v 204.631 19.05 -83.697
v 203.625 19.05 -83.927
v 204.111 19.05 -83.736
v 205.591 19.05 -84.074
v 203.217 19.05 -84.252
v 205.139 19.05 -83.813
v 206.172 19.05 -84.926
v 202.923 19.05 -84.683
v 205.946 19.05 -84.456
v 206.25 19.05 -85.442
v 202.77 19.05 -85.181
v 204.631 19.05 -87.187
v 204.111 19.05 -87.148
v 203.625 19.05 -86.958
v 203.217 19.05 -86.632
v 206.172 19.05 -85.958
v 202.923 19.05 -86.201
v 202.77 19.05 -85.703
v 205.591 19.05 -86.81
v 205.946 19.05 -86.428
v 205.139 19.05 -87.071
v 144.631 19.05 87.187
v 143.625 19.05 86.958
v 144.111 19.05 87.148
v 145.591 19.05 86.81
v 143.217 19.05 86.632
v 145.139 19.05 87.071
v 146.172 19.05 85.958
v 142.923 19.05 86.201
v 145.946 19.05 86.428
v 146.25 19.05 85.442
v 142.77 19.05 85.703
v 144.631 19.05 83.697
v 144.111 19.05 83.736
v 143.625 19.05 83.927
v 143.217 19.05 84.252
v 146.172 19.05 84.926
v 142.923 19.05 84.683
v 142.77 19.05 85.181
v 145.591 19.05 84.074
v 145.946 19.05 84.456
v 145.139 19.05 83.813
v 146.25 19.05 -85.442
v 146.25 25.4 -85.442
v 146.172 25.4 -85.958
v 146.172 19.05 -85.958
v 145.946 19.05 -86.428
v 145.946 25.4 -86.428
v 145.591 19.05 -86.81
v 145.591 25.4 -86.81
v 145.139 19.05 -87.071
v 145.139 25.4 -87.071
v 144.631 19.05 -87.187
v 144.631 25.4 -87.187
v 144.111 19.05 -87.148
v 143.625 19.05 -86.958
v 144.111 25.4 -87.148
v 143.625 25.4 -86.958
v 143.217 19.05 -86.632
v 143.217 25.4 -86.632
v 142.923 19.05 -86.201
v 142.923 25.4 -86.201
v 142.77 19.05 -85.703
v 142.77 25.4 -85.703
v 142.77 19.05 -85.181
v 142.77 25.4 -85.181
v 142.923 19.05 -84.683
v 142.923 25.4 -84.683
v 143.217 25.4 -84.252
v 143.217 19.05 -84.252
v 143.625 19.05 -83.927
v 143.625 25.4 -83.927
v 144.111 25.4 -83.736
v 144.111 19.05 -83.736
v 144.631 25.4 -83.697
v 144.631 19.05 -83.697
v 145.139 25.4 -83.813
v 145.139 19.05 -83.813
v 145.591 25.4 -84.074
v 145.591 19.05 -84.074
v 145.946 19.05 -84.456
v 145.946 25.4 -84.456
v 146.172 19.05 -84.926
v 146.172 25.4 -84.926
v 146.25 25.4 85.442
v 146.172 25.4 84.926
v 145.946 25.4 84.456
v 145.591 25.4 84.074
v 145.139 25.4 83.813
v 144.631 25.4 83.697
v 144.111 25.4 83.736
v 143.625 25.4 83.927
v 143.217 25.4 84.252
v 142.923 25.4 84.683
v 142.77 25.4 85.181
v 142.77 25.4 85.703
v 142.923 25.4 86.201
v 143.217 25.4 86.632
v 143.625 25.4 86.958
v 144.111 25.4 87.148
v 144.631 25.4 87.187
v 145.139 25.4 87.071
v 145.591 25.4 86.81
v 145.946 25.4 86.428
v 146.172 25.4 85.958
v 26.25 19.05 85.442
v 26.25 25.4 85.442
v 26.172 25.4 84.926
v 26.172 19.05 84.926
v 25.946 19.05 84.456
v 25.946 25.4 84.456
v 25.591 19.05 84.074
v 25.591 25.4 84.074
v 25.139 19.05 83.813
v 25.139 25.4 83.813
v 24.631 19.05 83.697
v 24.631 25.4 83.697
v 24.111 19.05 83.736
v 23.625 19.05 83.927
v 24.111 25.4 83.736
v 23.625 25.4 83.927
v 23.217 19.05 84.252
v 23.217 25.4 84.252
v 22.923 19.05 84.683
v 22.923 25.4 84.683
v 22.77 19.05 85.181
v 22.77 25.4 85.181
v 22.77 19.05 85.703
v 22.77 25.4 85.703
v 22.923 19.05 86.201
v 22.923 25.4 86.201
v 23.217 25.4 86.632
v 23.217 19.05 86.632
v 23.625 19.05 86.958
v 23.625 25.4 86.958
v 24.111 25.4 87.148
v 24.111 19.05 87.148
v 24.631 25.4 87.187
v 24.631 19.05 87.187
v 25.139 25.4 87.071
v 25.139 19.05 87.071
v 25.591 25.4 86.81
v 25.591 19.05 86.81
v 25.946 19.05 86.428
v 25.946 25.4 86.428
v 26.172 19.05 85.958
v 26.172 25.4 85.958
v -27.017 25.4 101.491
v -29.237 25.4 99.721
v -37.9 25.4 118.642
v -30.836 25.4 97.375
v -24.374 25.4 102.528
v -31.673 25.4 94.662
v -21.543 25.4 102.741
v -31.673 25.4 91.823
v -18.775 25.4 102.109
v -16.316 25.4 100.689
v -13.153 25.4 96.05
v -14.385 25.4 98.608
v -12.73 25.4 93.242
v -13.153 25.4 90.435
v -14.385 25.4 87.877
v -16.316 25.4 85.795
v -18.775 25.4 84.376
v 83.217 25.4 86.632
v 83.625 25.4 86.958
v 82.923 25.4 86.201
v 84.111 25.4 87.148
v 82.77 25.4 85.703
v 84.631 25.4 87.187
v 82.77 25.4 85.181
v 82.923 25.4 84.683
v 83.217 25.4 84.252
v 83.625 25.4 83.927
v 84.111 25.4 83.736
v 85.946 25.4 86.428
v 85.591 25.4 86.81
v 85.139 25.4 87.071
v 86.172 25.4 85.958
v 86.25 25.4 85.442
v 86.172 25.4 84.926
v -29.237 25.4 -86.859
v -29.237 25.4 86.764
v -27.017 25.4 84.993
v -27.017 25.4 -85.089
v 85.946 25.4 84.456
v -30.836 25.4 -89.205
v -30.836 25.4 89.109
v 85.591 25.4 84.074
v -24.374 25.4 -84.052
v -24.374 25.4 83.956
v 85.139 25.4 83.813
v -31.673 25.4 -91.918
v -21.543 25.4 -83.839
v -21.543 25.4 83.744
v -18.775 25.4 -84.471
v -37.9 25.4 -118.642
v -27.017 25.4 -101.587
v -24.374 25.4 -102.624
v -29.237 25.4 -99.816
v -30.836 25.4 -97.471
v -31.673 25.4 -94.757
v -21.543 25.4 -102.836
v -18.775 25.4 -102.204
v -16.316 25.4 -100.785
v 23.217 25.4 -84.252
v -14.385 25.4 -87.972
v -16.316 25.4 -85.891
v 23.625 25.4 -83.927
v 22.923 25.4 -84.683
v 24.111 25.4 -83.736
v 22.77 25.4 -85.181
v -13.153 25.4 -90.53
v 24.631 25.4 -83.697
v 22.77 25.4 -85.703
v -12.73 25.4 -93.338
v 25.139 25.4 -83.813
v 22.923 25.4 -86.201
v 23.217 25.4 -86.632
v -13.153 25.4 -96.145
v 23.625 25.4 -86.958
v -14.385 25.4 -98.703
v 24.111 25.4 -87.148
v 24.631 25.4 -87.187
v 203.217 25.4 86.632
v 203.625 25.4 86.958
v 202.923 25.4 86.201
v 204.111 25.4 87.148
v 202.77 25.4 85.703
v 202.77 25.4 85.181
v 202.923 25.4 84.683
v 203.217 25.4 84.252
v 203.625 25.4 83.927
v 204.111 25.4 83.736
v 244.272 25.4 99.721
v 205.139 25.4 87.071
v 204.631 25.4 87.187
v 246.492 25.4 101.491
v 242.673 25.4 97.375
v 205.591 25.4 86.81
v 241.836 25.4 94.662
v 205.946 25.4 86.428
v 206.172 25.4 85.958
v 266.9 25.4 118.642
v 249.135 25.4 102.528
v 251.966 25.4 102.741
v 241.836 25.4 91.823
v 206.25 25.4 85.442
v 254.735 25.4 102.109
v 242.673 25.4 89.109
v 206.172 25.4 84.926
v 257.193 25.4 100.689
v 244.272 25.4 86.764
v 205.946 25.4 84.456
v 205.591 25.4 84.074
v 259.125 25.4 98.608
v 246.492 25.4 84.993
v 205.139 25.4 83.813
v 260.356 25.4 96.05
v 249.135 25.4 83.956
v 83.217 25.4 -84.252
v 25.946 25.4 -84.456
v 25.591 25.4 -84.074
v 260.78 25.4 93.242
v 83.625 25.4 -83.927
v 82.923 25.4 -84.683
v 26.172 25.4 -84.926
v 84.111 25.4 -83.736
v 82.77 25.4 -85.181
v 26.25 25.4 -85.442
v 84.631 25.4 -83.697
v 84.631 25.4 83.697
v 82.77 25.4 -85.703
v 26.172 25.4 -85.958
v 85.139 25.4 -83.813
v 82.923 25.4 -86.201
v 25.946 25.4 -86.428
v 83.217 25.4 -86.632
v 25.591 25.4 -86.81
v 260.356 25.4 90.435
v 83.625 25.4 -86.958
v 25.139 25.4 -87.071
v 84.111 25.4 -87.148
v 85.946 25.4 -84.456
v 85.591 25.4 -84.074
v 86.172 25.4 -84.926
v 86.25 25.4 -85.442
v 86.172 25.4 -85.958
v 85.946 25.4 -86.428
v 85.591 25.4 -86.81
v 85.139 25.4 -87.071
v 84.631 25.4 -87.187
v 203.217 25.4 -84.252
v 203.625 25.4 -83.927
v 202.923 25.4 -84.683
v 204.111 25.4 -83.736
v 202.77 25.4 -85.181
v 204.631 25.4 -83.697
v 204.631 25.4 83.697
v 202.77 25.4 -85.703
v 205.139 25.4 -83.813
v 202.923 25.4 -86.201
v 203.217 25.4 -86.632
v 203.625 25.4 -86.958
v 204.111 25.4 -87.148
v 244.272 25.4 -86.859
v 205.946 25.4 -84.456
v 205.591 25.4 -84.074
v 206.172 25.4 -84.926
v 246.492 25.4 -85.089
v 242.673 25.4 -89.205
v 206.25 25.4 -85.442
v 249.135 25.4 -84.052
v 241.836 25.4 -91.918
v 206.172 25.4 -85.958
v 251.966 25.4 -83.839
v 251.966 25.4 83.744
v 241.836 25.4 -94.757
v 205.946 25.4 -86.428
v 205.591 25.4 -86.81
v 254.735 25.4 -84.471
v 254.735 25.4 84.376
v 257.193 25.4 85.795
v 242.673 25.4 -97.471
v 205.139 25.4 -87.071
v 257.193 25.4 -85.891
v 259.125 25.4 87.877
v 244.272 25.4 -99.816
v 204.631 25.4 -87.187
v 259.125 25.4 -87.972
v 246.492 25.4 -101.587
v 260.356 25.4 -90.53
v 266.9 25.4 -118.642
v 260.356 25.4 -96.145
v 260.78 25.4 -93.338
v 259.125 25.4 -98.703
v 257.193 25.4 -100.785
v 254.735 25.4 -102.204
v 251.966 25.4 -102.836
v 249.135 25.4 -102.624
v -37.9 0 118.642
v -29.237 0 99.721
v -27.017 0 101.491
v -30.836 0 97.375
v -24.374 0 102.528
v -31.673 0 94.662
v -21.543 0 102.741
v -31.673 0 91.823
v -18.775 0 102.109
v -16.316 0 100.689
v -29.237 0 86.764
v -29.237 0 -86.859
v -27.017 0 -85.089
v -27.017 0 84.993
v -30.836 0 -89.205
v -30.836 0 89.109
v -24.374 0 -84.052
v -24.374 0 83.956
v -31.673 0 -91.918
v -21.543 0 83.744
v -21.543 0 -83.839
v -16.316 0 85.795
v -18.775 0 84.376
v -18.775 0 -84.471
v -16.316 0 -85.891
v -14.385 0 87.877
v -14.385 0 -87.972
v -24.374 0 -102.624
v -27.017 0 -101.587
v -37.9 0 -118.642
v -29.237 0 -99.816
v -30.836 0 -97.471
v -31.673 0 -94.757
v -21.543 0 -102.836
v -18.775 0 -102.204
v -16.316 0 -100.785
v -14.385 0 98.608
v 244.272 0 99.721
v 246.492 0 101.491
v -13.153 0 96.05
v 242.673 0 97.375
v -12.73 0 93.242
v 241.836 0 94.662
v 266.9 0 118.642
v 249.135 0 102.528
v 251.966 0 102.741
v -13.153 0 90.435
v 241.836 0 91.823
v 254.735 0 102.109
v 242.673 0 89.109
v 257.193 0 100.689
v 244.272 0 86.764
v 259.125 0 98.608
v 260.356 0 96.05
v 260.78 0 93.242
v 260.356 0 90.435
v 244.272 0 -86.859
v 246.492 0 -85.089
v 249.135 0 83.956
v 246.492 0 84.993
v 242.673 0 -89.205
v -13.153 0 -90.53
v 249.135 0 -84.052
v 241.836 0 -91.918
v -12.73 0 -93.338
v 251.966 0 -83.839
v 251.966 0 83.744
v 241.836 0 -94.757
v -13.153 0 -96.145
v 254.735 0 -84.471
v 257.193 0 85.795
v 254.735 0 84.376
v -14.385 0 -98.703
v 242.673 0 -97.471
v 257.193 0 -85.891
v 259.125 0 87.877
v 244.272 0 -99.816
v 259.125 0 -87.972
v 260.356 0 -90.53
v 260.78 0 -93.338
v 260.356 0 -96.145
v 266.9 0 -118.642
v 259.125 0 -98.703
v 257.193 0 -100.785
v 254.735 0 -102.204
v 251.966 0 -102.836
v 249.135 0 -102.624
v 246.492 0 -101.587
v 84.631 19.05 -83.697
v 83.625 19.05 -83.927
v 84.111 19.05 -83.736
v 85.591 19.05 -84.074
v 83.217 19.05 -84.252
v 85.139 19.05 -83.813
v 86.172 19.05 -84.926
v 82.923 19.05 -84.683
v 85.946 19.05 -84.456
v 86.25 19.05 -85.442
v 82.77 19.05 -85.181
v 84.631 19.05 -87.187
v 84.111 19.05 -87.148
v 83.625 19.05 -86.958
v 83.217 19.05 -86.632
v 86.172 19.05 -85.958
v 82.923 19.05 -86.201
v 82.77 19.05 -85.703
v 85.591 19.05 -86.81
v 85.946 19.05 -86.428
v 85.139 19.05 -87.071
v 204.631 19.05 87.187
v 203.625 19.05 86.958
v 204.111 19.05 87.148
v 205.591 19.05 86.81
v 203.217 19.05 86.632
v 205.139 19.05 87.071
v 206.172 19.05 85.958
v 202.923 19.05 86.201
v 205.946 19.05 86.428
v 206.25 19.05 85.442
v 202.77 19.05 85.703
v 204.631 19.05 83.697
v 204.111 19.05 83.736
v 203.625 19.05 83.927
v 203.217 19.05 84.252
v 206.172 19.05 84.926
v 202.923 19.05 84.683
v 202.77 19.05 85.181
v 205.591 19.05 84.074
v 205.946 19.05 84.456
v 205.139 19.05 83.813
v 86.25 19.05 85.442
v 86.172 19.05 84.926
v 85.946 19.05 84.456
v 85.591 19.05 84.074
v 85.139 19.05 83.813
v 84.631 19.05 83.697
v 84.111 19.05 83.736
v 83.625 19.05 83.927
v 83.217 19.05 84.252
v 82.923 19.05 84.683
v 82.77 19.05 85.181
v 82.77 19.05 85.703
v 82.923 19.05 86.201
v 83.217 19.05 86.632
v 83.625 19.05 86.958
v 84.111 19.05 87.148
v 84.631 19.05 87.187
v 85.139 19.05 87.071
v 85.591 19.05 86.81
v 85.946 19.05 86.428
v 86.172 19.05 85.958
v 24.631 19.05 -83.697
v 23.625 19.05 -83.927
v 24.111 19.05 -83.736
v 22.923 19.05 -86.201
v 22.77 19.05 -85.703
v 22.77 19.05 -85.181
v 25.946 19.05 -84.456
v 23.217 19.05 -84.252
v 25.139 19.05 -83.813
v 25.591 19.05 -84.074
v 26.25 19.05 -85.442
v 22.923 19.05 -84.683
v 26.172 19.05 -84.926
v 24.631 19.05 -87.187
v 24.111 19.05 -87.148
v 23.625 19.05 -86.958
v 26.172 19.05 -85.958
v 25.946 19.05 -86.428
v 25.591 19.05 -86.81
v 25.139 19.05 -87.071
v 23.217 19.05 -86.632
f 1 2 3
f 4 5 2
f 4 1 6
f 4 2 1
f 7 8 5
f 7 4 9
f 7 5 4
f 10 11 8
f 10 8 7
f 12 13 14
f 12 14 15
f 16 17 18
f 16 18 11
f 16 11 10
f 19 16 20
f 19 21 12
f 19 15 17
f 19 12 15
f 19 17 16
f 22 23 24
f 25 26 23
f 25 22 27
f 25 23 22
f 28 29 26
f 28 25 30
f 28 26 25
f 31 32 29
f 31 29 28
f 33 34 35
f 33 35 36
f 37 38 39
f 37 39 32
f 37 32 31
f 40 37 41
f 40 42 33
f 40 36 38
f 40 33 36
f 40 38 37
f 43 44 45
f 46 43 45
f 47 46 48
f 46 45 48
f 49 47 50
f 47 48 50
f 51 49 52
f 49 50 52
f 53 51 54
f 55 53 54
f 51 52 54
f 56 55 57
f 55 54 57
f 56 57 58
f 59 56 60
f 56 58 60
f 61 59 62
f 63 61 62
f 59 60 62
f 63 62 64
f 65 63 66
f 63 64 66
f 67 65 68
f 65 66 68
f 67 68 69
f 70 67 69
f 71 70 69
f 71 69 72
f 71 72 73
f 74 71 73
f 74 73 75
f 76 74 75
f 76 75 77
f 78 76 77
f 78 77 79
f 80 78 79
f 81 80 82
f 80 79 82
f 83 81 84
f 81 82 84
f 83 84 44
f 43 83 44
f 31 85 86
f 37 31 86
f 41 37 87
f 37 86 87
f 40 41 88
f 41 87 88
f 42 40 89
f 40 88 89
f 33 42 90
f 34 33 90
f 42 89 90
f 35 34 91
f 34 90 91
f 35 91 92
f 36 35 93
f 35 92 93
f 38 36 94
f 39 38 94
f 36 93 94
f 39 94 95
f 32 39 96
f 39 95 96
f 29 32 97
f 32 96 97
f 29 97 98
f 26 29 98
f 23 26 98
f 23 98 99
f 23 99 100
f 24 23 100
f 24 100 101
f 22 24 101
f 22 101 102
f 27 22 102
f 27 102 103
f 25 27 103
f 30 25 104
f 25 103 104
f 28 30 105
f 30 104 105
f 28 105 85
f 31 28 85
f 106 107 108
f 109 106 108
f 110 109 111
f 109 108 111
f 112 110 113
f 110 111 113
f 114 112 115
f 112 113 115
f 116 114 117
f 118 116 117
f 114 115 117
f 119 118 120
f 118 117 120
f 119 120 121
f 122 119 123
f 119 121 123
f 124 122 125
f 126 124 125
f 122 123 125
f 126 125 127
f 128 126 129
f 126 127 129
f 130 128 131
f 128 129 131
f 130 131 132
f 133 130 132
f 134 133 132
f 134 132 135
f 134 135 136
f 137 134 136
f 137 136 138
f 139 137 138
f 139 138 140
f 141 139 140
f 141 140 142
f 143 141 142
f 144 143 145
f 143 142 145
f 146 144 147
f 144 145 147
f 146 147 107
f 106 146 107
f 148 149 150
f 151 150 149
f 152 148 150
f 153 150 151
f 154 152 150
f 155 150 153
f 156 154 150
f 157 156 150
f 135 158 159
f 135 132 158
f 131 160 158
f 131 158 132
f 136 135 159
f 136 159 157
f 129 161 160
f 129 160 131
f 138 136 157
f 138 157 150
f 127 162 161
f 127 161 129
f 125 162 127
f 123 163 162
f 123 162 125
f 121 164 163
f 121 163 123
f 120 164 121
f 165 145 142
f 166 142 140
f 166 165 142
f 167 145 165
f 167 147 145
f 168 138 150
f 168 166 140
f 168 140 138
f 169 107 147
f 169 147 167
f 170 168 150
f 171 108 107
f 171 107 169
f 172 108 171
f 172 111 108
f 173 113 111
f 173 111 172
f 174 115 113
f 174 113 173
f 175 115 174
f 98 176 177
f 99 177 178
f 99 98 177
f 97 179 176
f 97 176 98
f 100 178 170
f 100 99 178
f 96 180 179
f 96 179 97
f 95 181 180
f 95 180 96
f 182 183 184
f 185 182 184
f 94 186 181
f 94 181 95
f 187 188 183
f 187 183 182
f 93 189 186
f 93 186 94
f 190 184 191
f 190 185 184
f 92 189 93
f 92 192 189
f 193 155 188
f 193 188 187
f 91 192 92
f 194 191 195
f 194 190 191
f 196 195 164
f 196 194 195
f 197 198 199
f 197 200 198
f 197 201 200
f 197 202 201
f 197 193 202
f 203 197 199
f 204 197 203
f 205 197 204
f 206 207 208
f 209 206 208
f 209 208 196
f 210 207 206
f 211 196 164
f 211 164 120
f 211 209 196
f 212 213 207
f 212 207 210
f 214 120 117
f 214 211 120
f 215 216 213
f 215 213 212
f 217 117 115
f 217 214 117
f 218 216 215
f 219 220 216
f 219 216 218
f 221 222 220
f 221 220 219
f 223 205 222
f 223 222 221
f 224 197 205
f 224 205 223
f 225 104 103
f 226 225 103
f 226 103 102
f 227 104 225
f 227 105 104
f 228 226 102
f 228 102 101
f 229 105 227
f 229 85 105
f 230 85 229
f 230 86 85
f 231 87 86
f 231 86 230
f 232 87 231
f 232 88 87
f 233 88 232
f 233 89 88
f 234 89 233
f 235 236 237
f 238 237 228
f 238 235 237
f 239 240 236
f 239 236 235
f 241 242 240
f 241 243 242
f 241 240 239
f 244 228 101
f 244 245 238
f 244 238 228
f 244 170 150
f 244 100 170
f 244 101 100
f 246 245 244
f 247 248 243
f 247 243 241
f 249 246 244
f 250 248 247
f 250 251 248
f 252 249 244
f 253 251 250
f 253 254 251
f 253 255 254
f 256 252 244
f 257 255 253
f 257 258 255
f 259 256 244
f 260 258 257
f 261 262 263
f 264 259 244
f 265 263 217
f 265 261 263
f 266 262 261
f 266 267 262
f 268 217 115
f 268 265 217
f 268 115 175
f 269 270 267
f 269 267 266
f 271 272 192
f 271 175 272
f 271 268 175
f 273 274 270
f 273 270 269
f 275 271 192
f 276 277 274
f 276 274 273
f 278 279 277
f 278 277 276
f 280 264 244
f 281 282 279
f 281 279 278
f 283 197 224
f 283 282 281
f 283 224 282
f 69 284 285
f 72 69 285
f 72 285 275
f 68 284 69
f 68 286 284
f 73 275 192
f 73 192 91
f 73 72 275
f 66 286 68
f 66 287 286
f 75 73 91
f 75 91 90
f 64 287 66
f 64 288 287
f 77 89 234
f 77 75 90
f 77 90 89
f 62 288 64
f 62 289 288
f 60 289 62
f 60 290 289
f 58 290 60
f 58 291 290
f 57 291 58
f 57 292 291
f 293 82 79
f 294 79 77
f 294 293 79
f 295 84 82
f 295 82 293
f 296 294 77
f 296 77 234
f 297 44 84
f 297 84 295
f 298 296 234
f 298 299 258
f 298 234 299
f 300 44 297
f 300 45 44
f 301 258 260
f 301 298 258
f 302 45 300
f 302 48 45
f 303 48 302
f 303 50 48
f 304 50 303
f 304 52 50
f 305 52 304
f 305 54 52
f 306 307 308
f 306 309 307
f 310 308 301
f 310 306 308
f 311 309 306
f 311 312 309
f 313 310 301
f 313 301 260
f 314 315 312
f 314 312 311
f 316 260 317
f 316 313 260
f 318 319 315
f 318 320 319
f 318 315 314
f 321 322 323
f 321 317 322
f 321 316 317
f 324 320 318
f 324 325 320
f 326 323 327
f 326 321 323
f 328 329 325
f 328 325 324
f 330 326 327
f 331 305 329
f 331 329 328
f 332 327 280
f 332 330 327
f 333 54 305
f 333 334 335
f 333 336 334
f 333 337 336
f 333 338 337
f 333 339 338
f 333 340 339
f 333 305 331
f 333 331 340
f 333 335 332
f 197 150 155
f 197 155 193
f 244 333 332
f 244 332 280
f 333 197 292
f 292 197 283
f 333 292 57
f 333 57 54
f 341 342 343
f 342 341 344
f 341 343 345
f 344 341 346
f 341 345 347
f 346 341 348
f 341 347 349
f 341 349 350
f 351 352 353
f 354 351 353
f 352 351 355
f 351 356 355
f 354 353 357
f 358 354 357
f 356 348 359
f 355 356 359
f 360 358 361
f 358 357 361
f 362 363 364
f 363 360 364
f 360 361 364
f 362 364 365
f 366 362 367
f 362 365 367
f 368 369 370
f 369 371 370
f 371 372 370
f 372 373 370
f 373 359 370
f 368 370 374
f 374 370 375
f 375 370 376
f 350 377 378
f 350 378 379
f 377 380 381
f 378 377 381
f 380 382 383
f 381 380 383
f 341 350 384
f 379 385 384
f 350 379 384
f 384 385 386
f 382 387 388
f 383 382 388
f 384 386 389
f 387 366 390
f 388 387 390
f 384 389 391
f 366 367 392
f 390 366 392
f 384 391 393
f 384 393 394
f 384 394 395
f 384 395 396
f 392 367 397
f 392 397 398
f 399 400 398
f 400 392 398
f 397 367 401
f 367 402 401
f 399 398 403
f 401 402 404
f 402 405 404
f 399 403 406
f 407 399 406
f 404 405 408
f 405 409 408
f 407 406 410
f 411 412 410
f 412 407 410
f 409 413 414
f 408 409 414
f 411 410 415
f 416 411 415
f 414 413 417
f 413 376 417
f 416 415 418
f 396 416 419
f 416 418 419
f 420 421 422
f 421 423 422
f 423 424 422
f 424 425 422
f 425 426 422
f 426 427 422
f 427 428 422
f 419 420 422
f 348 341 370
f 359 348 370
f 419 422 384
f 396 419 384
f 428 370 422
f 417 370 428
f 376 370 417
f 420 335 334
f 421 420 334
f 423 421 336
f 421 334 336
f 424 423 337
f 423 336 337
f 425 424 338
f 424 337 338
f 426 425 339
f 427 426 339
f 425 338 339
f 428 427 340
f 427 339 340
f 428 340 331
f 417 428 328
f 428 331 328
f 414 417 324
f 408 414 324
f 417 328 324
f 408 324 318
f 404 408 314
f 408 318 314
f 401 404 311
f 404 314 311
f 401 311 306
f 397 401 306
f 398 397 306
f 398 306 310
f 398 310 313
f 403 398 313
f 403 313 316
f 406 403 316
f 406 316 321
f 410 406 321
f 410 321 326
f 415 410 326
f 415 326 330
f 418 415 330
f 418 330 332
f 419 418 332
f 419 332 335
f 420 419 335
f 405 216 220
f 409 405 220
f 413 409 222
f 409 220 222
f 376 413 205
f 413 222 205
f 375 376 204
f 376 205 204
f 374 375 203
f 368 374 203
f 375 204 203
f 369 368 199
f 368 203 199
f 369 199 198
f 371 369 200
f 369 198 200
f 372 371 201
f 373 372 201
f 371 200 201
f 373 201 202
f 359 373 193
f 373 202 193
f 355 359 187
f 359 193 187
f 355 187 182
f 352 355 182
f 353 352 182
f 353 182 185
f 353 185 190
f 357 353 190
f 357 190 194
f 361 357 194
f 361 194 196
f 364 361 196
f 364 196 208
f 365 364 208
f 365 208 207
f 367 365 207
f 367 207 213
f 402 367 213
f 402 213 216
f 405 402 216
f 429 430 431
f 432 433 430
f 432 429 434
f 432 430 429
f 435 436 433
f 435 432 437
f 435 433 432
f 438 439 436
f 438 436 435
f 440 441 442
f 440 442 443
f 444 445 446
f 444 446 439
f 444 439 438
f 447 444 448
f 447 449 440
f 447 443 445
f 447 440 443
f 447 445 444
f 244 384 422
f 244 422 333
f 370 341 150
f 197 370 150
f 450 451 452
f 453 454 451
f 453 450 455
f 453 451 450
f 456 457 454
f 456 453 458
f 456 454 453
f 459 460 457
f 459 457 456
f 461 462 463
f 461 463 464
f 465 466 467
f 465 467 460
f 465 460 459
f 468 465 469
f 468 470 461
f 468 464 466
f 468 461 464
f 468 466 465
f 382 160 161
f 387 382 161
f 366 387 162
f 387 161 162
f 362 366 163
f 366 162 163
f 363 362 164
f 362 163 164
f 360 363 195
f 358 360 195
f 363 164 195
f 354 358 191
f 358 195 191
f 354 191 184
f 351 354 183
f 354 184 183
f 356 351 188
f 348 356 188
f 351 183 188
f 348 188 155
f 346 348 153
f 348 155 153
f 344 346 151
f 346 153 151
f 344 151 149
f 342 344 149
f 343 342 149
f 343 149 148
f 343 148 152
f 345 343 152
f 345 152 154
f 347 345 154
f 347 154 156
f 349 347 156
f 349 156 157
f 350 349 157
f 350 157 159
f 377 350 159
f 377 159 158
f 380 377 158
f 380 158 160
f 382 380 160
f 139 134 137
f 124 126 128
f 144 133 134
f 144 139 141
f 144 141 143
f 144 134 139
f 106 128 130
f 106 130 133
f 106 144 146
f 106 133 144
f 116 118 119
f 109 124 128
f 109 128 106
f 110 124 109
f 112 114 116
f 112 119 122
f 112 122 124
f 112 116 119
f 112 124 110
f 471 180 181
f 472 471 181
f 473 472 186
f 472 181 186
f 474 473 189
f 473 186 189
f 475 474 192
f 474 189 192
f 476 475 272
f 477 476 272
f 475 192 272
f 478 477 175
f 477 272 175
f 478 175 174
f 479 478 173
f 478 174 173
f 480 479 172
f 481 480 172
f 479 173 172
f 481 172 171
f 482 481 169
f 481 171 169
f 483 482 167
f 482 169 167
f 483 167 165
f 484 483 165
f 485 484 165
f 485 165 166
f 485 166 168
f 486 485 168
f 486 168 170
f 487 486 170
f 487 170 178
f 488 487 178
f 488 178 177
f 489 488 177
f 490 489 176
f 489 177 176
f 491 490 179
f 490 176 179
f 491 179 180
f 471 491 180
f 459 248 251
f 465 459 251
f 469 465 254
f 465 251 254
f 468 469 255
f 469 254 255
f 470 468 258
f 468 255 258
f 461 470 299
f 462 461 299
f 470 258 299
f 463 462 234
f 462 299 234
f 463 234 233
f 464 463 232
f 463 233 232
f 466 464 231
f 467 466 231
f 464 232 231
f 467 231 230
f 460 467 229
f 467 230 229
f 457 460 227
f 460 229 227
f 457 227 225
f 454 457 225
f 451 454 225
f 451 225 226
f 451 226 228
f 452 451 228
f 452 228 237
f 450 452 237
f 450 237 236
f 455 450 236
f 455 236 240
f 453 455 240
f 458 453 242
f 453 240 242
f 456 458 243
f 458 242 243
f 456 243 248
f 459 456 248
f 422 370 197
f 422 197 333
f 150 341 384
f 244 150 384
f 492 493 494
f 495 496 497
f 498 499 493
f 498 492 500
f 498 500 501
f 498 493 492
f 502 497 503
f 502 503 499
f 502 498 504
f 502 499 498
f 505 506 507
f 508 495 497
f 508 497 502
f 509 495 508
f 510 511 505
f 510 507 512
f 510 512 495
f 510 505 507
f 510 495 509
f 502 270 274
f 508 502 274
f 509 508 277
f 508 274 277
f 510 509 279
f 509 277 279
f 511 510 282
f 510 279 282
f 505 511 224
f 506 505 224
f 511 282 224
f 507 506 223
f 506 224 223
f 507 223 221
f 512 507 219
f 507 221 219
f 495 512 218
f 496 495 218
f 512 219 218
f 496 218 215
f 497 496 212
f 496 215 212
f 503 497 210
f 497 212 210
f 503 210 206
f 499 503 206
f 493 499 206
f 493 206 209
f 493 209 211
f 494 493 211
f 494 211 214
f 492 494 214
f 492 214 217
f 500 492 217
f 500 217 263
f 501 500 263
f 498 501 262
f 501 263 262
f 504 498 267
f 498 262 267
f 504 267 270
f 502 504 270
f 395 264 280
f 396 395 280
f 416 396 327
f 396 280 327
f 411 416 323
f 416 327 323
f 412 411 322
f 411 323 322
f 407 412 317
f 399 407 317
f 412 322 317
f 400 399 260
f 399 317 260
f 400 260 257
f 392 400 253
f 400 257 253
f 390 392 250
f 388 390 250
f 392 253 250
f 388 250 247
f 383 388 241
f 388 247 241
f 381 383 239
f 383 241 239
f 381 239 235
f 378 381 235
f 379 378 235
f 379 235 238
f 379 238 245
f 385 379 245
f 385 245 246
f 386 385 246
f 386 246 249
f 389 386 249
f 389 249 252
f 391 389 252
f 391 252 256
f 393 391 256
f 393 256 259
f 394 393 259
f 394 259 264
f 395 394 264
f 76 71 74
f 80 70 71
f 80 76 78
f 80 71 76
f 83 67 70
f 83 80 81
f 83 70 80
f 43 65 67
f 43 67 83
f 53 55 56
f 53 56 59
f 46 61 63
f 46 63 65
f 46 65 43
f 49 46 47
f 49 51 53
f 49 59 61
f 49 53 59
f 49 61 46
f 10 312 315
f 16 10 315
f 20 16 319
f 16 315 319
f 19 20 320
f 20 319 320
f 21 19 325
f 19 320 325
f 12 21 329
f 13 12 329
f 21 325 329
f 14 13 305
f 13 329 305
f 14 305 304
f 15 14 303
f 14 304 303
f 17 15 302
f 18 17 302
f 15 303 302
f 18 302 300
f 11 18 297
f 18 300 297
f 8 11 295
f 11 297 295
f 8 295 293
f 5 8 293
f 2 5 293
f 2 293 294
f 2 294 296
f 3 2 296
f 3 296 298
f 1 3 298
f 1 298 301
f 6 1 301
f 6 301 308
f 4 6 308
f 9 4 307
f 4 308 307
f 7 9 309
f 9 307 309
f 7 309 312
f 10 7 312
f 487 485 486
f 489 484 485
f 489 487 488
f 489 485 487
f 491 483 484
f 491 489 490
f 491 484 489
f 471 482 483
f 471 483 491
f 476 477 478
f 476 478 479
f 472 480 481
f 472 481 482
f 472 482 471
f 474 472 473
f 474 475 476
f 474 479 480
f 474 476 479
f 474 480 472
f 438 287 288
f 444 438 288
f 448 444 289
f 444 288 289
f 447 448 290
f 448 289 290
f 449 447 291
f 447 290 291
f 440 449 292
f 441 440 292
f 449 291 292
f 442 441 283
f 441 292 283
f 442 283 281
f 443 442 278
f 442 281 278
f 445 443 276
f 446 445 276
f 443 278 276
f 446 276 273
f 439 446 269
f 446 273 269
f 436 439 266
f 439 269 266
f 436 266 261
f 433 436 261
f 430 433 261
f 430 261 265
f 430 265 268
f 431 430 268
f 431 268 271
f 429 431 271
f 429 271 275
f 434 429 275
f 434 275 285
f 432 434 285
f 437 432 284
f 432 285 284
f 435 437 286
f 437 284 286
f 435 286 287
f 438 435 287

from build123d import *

# Parameters (mm, degrees)
SKETCH1_W           = 317.959323002
SKETCH1_H           = 237.284389444
BOSS_EXTRUDE1_DEPTH = 25.4
CUT_EXTRUDE1_START  = 25.4
SKETCH1_3_R         = 1.75
CUT_EXTRUDE1_DEPTH  = 6.35
SKETCH5_R           = 9.525
CUT_EXTRUDE2_DEPTH  = 26.4
CUT_EXTRUDE3_REACH  = 239.284
SKETCH6_W           = 11.775930683
SKETCH6_H           = 25.4
SKETCH6_W_2         = 11.132113684


with BuildPart() as part:
    # Sketch1 → Boss-Extrude1 (new body)
    with BuildSketch(Plane(origin=(0, 0, 0), x_dir=(1, 0, 0), z_dir=(0, 1, 0))):
        with Locations((114.5, 0)):
            Rectangle(SKETCH1_W, SKETCH1_H)
    extrude(amount=BOSS_EXTRUDE1_DEPTH)

    # Sketch1<3> → Cut-Extrude1 (cut)
    with BuildSketch(Plane(origin=(0, 0, 0), x_dir=(1, 0, 0), z_dir=(0, 1, 0)).offset(CUT_EXTRUDE1_START)):
        with Locations((24.5, 85.442194722)):
            Circle(SKETCH1_3_R)
        with Locations((84.5, 85.442194722)):
            Circle(SKETCH1_3_R)
        with Locations((144.5, 85.442194722)):
            Circle(SKETCH1_3_R)
        with Locations((204.5, 85.442194722)):
            Circle(SKETCH1_3_R)
        with Locations((24.5, -85.442194722)):
            Circle(SKETCH1_3_R)
        with Locations((84.5, -85.442194722)):
            Circle(SKETCH1_3_R)
        with Locations((144.5, -85.442194722)):
            Circle(SKETCH1_3_R)
        with Locations((204.5, -85.442194722)):
            Circle(SKETCH1_3_R)
    extrude(amount=-CUT_EXTRUDE1_DEPTH, mode=Mode.SUBTRACT)

    # Sketch5 → Cut-Extrude2 (cut, through all)
    with BuildSketch(Plane(origin=(0, 25.4, 0), x_dir=(1, 0, 0), z_dir=(0, 1, 0))):
        with Locations((-22.254661501, -93.242194722)):
            Circle(SKETCH5_R)
        with Locations((251.254661501, -93.242194722)):
            Circle(SKETCH5_R)
        with Locations((251.254661501, 93.337805278)):
            Circle(SKETCH5_R)
        with Locations((-22.254661501, 93.337805278)):
            Circle(SKETCH5_R)
    extrude(amount=-CUT_EXTRUDE2_DEPTH, mode=Mode.SUBTRACT)

    # Sketch6 → Cut-Extrude3 (cut, up to next)
    with BuildSketch(Plane.XY.offset(118.642194722), mode=Mode.PRIVATE) as cut_extrude3_sk1:
        with Locations((-43.787965342, 12.7)):
            Rectangle(SKETCH6_W, SKETCH6_H)
    cut_extrude3_tool1 = extrude(cut_extrude3_sk1.sketch, amount=-CUT_EXTRUDE3_REACH, mode=Mode.PRIVATE) & part.part
    add(cut_extrude3_tool1.solids().sort_by_distance((-43.787965, 12.7, 118.642195))[0], mode=Mode.SUBTRACT)
    # Sketch6 → Cut-Extrude3 (cut, up to next)
    with BuildSketch(Plane.XY.offset(118.642194722), mode=Mode.PRIVATE) as cut_extrude3_sk2:
        with Locations((272.466056842, 12.7)):
            Rectangle(SKETCH6_W_2, SKETCH6_H)
    cut_extrude3_tool2 = extrude(cut_extrude3_sk2.sketch, amount=-CUT_EXTRUDE3_REACH, mode=Mode.PRIVATE) & part.part
    add(cut_extrude3_tool2.solids().sort_by_distance((272.466057, 12.7, 118.642195))[0], mode=Mode.SUBTRACT)


solid = part.part
